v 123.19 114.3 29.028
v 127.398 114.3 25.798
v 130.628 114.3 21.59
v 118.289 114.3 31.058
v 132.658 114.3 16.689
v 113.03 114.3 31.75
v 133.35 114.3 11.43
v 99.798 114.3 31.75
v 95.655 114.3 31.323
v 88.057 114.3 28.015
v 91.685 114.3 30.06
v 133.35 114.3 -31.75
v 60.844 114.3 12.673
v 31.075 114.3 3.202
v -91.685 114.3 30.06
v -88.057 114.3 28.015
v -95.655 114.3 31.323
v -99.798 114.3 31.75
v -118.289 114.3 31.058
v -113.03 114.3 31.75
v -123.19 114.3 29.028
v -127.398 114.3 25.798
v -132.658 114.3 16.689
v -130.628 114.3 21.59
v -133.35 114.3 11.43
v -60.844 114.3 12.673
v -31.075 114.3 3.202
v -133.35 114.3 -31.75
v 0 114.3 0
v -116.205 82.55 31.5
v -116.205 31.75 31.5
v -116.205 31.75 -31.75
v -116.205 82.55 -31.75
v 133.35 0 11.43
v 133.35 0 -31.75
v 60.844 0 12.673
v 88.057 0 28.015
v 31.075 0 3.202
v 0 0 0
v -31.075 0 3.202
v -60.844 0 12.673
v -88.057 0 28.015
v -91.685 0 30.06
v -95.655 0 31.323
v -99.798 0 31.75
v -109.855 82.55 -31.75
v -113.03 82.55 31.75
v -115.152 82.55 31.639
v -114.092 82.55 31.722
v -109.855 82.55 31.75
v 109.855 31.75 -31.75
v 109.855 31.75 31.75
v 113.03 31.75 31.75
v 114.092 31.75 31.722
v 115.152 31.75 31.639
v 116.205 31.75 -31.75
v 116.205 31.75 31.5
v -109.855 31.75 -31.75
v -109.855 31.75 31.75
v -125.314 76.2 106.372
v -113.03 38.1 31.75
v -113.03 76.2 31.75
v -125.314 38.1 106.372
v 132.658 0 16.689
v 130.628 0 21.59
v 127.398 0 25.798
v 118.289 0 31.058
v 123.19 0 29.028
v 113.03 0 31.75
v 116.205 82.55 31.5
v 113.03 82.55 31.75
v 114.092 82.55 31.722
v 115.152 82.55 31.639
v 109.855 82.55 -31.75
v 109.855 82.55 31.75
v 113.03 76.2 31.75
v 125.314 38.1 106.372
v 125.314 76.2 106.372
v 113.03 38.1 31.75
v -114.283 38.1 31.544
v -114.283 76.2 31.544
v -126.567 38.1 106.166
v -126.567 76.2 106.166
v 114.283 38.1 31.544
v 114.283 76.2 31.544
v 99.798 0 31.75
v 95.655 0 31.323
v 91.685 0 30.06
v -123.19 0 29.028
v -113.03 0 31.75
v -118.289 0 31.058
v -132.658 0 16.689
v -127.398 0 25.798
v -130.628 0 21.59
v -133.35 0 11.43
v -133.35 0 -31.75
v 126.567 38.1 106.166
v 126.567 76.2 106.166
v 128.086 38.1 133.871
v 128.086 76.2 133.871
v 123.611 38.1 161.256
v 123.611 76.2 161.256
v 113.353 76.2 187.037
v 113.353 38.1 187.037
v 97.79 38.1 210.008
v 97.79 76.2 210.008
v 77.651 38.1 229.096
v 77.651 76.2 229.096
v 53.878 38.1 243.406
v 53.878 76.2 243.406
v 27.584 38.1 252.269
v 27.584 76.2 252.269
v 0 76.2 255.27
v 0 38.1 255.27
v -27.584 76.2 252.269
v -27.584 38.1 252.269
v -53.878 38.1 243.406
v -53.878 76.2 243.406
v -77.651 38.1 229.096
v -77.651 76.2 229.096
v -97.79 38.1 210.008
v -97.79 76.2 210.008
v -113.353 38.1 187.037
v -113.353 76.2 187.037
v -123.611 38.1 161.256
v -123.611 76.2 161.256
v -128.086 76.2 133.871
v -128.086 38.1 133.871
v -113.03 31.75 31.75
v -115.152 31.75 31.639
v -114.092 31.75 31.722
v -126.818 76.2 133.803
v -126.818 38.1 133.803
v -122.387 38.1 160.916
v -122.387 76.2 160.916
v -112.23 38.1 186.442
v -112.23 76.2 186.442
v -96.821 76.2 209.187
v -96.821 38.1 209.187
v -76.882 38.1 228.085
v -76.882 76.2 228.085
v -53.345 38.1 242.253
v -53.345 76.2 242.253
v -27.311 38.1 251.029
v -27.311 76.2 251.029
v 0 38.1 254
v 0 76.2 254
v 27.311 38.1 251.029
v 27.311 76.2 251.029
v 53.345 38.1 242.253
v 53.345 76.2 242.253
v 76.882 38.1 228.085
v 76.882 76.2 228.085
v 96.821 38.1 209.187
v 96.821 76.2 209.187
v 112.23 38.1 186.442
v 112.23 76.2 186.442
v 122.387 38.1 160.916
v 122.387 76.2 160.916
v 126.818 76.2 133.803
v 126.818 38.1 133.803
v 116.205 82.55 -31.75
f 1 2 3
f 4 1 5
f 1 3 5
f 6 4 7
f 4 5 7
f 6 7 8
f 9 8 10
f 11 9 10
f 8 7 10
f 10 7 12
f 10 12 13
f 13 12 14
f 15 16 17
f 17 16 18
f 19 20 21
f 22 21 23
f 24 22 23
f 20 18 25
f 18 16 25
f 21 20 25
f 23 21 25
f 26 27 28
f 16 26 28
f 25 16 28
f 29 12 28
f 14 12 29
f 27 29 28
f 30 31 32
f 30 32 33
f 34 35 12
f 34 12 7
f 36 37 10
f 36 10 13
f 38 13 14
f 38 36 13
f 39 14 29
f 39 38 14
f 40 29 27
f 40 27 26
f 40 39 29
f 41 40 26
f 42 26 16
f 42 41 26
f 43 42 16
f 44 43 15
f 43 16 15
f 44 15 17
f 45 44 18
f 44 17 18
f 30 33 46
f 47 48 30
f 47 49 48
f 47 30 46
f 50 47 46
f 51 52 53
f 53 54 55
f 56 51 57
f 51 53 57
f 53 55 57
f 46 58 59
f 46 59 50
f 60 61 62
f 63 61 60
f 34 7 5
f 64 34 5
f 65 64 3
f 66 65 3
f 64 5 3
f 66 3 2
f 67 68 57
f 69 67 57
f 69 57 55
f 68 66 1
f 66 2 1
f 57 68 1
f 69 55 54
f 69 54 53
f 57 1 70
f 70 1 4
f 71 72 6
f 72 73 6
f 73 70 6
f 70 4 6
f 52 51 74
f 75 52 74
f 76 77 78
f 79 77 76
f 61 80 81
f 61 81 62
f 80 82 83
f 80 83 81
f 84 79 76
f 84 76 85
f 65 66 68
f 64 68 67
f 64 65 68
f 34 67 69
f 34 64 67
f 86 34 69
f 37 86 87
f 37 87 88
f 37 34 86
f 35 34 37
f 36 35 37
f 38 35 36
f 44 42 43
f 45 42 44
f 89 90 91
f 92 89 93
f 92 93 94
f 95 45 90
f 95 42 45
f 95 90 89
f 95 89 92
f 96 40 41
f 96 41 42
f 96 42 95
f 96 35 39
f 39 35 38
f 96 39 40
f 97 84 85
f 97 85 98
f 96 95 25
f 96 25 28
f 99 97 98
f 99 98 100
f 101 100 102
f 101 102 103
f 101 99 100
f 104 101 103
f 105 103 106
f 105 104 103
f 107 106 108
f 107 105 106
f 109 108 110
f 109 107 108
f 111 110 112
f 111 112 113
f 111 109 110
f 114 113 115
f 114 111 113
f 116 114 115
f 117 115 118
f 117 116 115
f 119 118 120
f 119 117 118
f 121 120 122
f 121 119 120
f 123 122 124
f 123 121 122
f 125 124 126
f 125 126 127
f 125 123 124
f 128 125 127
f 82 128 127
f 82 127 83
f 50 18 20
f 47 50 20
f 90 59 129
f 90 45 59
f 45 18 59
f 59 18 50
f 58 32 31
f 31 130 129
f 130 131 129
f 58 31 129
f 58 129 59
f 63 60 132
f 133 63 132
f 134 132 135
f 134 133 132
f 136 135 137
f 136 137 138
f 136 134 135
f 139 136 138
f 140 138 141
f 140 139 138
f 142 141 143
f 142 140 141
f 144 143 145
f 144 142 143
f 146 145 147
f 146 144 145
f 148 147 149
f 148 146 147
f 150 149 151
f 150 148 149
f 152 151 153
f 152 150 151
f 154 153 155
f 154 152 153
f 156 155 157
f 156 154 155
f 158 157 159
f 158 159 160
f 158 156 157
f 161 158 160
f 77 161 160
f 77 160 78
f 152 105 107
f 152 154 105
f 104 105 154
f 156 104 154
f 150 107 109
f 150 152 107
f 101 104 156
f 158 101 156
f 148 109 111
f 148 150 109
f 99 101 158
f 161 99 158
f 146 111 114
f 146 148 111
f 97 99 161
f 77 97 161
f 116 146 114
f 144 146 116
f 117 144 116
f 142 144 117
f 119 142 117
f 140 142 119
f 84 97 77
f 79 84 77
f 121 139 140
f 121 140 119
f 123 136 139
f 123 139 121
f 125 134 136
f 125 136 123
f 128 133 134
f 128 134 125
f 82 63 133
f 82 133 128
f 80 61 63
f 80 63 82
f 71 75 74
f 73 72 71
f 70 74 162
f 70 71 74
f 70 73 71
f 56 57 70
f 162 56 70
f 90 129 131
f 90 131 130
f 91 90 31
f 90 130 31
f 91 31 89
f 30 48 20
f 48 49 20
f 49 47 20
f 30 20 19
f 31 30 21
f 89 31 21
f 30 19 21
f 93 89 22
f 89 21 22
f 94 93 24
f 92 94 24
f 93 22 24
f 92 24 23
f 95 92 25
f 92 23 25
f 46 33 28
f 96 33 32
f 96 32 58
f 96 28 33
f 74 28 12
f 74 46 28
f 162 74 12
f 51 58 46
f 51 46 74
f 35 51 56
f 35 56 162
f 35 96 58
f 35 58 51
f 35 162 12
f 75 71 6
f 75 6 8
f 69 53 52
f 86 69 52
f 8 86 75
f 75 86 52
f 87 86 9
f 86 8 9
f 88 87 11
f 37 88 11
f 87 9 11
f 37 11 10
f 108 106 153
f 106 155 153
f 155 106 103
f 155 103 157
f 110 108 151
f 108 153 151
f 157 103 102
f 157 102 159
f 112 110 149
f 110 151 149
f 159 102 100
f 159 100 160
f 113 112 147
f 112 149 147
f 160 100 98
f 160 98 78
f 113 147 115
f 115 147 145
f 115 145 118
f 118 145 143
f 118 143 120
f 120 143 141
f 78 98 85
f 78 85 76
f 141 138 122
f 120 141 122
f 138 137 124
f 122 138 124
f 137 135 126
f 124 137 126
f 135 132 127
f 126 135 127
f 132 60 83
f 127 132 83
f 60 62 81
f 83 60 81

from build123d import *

# Parameters (mm, degrees)
BOSS_EXTRUDE1_DEPTH = 114.3
FILLET1_R           = 20.32
FILLET2_R           = 20.32
SKETCH2_W           = 6.35
SKETCH2_H           = 50.8
CUT_EXTRUDE1_DEPTH  = 187.759102857
EXTRUDE_THIN1_START = 6.35
EXTRUDE_THIN1_DEPTH = 38.1


with BuildPart() as part:
    # Sketch1 → Boss-Extrude1 (new body)
    with BuildSketch(Plane(origin=(0, 0, 0), x_dir=(1, 0, 0), z_dir=(0, 1, 0))):
        with BuildLine():
            Line((-133.35, 31.75), (133.35, 31.75))
            Line((133.35, 31.75), (133.35, -31.75))
            Line((133.35, -31.75), (93.109277196, -31.75))
            ThreePointArc((93.109277196, -31.75), (0, 0), (-93.109277196, -31.75))
            Line((-93.109277196, -31.75), (-133.35, -31.75))
            Line((-133.35, -31.75), (-133.35, 31.75))
        make_face()
    extrude(amount=BOSS_EXTRUDE1_DEPTH)

    # Fillet1
    fillet1_edges = [part.edges().sort_by_distance(p)[0] for p in [
        (-133.35, 57.15, 31.75),
        (133.35, 57.15, 31.75),
    ]]
    fillet(fillet1_edges, radius=FILLET1_R)

    # Fillet2
    fillet2_edges = [part.edges().sort_by_distance(p)[0] for p in [
        (93.109277196, 57.15, 31.75),
        (-93.109277196, 57.15, 31.75),
    ]]
    fillet(fillet2_edges, radius=FILLET2_R)

    # Sketch2 → Cut-Extrude1 (cut, through all)
    with BuildSketch(Plane.XY.offset(31.75)):
        with Locations((-113.03, 57.15)):
            Rectangle(SKETCH2_W, SKETCH2_H)
        with Locations((113.03, 57.15)):
            Rectangle(SKETCH2_W, SKETCH2_H)
    extrude(amount=-CUT_EXTRUDE1_DEPTH, mode=Mode.SUBTRACT)


with BuildPart() as body_2:
    # Sketch3 → Extrude-Thin1 (new body)
    with BuildSketch(Plane(origin=(0, 31.75, 0), x_dir=(1, 0, 0), z_dir=(0, 1, 0)).offset(EXTRUDE_THIN1_START)):
        with BuildLine():
            Line((-113.03, -31.75), (-125.313565249, -106.372097429))
            ThreePointArc((-125.313565249, -106.372097429), (0, -254), (125.313565249, -106.372097429))
            Line((125.313565249, -106.372097429), (113.03, -31.75))
            Line((113.03, -31.75), (114.283135652, -31.543720974))
            Line((114.283135652, -31.543720974), (126.566700902, -106.165818404))
            ThreePointArc((126.566700902, -106.165818404), (0, -255.27), (-126.566700902, -106.165818404))
            Line((-126.566700902, -106.165818404), (-114.283135652, -31.543720974))
            Line((-114.283135652, -31.543720974), (-113.03, -31.75))
        make_face()
    extrude(amount=EXTRUDE_THIN1_DEPTH)


solid = Compound([part.part, body_2.part])
